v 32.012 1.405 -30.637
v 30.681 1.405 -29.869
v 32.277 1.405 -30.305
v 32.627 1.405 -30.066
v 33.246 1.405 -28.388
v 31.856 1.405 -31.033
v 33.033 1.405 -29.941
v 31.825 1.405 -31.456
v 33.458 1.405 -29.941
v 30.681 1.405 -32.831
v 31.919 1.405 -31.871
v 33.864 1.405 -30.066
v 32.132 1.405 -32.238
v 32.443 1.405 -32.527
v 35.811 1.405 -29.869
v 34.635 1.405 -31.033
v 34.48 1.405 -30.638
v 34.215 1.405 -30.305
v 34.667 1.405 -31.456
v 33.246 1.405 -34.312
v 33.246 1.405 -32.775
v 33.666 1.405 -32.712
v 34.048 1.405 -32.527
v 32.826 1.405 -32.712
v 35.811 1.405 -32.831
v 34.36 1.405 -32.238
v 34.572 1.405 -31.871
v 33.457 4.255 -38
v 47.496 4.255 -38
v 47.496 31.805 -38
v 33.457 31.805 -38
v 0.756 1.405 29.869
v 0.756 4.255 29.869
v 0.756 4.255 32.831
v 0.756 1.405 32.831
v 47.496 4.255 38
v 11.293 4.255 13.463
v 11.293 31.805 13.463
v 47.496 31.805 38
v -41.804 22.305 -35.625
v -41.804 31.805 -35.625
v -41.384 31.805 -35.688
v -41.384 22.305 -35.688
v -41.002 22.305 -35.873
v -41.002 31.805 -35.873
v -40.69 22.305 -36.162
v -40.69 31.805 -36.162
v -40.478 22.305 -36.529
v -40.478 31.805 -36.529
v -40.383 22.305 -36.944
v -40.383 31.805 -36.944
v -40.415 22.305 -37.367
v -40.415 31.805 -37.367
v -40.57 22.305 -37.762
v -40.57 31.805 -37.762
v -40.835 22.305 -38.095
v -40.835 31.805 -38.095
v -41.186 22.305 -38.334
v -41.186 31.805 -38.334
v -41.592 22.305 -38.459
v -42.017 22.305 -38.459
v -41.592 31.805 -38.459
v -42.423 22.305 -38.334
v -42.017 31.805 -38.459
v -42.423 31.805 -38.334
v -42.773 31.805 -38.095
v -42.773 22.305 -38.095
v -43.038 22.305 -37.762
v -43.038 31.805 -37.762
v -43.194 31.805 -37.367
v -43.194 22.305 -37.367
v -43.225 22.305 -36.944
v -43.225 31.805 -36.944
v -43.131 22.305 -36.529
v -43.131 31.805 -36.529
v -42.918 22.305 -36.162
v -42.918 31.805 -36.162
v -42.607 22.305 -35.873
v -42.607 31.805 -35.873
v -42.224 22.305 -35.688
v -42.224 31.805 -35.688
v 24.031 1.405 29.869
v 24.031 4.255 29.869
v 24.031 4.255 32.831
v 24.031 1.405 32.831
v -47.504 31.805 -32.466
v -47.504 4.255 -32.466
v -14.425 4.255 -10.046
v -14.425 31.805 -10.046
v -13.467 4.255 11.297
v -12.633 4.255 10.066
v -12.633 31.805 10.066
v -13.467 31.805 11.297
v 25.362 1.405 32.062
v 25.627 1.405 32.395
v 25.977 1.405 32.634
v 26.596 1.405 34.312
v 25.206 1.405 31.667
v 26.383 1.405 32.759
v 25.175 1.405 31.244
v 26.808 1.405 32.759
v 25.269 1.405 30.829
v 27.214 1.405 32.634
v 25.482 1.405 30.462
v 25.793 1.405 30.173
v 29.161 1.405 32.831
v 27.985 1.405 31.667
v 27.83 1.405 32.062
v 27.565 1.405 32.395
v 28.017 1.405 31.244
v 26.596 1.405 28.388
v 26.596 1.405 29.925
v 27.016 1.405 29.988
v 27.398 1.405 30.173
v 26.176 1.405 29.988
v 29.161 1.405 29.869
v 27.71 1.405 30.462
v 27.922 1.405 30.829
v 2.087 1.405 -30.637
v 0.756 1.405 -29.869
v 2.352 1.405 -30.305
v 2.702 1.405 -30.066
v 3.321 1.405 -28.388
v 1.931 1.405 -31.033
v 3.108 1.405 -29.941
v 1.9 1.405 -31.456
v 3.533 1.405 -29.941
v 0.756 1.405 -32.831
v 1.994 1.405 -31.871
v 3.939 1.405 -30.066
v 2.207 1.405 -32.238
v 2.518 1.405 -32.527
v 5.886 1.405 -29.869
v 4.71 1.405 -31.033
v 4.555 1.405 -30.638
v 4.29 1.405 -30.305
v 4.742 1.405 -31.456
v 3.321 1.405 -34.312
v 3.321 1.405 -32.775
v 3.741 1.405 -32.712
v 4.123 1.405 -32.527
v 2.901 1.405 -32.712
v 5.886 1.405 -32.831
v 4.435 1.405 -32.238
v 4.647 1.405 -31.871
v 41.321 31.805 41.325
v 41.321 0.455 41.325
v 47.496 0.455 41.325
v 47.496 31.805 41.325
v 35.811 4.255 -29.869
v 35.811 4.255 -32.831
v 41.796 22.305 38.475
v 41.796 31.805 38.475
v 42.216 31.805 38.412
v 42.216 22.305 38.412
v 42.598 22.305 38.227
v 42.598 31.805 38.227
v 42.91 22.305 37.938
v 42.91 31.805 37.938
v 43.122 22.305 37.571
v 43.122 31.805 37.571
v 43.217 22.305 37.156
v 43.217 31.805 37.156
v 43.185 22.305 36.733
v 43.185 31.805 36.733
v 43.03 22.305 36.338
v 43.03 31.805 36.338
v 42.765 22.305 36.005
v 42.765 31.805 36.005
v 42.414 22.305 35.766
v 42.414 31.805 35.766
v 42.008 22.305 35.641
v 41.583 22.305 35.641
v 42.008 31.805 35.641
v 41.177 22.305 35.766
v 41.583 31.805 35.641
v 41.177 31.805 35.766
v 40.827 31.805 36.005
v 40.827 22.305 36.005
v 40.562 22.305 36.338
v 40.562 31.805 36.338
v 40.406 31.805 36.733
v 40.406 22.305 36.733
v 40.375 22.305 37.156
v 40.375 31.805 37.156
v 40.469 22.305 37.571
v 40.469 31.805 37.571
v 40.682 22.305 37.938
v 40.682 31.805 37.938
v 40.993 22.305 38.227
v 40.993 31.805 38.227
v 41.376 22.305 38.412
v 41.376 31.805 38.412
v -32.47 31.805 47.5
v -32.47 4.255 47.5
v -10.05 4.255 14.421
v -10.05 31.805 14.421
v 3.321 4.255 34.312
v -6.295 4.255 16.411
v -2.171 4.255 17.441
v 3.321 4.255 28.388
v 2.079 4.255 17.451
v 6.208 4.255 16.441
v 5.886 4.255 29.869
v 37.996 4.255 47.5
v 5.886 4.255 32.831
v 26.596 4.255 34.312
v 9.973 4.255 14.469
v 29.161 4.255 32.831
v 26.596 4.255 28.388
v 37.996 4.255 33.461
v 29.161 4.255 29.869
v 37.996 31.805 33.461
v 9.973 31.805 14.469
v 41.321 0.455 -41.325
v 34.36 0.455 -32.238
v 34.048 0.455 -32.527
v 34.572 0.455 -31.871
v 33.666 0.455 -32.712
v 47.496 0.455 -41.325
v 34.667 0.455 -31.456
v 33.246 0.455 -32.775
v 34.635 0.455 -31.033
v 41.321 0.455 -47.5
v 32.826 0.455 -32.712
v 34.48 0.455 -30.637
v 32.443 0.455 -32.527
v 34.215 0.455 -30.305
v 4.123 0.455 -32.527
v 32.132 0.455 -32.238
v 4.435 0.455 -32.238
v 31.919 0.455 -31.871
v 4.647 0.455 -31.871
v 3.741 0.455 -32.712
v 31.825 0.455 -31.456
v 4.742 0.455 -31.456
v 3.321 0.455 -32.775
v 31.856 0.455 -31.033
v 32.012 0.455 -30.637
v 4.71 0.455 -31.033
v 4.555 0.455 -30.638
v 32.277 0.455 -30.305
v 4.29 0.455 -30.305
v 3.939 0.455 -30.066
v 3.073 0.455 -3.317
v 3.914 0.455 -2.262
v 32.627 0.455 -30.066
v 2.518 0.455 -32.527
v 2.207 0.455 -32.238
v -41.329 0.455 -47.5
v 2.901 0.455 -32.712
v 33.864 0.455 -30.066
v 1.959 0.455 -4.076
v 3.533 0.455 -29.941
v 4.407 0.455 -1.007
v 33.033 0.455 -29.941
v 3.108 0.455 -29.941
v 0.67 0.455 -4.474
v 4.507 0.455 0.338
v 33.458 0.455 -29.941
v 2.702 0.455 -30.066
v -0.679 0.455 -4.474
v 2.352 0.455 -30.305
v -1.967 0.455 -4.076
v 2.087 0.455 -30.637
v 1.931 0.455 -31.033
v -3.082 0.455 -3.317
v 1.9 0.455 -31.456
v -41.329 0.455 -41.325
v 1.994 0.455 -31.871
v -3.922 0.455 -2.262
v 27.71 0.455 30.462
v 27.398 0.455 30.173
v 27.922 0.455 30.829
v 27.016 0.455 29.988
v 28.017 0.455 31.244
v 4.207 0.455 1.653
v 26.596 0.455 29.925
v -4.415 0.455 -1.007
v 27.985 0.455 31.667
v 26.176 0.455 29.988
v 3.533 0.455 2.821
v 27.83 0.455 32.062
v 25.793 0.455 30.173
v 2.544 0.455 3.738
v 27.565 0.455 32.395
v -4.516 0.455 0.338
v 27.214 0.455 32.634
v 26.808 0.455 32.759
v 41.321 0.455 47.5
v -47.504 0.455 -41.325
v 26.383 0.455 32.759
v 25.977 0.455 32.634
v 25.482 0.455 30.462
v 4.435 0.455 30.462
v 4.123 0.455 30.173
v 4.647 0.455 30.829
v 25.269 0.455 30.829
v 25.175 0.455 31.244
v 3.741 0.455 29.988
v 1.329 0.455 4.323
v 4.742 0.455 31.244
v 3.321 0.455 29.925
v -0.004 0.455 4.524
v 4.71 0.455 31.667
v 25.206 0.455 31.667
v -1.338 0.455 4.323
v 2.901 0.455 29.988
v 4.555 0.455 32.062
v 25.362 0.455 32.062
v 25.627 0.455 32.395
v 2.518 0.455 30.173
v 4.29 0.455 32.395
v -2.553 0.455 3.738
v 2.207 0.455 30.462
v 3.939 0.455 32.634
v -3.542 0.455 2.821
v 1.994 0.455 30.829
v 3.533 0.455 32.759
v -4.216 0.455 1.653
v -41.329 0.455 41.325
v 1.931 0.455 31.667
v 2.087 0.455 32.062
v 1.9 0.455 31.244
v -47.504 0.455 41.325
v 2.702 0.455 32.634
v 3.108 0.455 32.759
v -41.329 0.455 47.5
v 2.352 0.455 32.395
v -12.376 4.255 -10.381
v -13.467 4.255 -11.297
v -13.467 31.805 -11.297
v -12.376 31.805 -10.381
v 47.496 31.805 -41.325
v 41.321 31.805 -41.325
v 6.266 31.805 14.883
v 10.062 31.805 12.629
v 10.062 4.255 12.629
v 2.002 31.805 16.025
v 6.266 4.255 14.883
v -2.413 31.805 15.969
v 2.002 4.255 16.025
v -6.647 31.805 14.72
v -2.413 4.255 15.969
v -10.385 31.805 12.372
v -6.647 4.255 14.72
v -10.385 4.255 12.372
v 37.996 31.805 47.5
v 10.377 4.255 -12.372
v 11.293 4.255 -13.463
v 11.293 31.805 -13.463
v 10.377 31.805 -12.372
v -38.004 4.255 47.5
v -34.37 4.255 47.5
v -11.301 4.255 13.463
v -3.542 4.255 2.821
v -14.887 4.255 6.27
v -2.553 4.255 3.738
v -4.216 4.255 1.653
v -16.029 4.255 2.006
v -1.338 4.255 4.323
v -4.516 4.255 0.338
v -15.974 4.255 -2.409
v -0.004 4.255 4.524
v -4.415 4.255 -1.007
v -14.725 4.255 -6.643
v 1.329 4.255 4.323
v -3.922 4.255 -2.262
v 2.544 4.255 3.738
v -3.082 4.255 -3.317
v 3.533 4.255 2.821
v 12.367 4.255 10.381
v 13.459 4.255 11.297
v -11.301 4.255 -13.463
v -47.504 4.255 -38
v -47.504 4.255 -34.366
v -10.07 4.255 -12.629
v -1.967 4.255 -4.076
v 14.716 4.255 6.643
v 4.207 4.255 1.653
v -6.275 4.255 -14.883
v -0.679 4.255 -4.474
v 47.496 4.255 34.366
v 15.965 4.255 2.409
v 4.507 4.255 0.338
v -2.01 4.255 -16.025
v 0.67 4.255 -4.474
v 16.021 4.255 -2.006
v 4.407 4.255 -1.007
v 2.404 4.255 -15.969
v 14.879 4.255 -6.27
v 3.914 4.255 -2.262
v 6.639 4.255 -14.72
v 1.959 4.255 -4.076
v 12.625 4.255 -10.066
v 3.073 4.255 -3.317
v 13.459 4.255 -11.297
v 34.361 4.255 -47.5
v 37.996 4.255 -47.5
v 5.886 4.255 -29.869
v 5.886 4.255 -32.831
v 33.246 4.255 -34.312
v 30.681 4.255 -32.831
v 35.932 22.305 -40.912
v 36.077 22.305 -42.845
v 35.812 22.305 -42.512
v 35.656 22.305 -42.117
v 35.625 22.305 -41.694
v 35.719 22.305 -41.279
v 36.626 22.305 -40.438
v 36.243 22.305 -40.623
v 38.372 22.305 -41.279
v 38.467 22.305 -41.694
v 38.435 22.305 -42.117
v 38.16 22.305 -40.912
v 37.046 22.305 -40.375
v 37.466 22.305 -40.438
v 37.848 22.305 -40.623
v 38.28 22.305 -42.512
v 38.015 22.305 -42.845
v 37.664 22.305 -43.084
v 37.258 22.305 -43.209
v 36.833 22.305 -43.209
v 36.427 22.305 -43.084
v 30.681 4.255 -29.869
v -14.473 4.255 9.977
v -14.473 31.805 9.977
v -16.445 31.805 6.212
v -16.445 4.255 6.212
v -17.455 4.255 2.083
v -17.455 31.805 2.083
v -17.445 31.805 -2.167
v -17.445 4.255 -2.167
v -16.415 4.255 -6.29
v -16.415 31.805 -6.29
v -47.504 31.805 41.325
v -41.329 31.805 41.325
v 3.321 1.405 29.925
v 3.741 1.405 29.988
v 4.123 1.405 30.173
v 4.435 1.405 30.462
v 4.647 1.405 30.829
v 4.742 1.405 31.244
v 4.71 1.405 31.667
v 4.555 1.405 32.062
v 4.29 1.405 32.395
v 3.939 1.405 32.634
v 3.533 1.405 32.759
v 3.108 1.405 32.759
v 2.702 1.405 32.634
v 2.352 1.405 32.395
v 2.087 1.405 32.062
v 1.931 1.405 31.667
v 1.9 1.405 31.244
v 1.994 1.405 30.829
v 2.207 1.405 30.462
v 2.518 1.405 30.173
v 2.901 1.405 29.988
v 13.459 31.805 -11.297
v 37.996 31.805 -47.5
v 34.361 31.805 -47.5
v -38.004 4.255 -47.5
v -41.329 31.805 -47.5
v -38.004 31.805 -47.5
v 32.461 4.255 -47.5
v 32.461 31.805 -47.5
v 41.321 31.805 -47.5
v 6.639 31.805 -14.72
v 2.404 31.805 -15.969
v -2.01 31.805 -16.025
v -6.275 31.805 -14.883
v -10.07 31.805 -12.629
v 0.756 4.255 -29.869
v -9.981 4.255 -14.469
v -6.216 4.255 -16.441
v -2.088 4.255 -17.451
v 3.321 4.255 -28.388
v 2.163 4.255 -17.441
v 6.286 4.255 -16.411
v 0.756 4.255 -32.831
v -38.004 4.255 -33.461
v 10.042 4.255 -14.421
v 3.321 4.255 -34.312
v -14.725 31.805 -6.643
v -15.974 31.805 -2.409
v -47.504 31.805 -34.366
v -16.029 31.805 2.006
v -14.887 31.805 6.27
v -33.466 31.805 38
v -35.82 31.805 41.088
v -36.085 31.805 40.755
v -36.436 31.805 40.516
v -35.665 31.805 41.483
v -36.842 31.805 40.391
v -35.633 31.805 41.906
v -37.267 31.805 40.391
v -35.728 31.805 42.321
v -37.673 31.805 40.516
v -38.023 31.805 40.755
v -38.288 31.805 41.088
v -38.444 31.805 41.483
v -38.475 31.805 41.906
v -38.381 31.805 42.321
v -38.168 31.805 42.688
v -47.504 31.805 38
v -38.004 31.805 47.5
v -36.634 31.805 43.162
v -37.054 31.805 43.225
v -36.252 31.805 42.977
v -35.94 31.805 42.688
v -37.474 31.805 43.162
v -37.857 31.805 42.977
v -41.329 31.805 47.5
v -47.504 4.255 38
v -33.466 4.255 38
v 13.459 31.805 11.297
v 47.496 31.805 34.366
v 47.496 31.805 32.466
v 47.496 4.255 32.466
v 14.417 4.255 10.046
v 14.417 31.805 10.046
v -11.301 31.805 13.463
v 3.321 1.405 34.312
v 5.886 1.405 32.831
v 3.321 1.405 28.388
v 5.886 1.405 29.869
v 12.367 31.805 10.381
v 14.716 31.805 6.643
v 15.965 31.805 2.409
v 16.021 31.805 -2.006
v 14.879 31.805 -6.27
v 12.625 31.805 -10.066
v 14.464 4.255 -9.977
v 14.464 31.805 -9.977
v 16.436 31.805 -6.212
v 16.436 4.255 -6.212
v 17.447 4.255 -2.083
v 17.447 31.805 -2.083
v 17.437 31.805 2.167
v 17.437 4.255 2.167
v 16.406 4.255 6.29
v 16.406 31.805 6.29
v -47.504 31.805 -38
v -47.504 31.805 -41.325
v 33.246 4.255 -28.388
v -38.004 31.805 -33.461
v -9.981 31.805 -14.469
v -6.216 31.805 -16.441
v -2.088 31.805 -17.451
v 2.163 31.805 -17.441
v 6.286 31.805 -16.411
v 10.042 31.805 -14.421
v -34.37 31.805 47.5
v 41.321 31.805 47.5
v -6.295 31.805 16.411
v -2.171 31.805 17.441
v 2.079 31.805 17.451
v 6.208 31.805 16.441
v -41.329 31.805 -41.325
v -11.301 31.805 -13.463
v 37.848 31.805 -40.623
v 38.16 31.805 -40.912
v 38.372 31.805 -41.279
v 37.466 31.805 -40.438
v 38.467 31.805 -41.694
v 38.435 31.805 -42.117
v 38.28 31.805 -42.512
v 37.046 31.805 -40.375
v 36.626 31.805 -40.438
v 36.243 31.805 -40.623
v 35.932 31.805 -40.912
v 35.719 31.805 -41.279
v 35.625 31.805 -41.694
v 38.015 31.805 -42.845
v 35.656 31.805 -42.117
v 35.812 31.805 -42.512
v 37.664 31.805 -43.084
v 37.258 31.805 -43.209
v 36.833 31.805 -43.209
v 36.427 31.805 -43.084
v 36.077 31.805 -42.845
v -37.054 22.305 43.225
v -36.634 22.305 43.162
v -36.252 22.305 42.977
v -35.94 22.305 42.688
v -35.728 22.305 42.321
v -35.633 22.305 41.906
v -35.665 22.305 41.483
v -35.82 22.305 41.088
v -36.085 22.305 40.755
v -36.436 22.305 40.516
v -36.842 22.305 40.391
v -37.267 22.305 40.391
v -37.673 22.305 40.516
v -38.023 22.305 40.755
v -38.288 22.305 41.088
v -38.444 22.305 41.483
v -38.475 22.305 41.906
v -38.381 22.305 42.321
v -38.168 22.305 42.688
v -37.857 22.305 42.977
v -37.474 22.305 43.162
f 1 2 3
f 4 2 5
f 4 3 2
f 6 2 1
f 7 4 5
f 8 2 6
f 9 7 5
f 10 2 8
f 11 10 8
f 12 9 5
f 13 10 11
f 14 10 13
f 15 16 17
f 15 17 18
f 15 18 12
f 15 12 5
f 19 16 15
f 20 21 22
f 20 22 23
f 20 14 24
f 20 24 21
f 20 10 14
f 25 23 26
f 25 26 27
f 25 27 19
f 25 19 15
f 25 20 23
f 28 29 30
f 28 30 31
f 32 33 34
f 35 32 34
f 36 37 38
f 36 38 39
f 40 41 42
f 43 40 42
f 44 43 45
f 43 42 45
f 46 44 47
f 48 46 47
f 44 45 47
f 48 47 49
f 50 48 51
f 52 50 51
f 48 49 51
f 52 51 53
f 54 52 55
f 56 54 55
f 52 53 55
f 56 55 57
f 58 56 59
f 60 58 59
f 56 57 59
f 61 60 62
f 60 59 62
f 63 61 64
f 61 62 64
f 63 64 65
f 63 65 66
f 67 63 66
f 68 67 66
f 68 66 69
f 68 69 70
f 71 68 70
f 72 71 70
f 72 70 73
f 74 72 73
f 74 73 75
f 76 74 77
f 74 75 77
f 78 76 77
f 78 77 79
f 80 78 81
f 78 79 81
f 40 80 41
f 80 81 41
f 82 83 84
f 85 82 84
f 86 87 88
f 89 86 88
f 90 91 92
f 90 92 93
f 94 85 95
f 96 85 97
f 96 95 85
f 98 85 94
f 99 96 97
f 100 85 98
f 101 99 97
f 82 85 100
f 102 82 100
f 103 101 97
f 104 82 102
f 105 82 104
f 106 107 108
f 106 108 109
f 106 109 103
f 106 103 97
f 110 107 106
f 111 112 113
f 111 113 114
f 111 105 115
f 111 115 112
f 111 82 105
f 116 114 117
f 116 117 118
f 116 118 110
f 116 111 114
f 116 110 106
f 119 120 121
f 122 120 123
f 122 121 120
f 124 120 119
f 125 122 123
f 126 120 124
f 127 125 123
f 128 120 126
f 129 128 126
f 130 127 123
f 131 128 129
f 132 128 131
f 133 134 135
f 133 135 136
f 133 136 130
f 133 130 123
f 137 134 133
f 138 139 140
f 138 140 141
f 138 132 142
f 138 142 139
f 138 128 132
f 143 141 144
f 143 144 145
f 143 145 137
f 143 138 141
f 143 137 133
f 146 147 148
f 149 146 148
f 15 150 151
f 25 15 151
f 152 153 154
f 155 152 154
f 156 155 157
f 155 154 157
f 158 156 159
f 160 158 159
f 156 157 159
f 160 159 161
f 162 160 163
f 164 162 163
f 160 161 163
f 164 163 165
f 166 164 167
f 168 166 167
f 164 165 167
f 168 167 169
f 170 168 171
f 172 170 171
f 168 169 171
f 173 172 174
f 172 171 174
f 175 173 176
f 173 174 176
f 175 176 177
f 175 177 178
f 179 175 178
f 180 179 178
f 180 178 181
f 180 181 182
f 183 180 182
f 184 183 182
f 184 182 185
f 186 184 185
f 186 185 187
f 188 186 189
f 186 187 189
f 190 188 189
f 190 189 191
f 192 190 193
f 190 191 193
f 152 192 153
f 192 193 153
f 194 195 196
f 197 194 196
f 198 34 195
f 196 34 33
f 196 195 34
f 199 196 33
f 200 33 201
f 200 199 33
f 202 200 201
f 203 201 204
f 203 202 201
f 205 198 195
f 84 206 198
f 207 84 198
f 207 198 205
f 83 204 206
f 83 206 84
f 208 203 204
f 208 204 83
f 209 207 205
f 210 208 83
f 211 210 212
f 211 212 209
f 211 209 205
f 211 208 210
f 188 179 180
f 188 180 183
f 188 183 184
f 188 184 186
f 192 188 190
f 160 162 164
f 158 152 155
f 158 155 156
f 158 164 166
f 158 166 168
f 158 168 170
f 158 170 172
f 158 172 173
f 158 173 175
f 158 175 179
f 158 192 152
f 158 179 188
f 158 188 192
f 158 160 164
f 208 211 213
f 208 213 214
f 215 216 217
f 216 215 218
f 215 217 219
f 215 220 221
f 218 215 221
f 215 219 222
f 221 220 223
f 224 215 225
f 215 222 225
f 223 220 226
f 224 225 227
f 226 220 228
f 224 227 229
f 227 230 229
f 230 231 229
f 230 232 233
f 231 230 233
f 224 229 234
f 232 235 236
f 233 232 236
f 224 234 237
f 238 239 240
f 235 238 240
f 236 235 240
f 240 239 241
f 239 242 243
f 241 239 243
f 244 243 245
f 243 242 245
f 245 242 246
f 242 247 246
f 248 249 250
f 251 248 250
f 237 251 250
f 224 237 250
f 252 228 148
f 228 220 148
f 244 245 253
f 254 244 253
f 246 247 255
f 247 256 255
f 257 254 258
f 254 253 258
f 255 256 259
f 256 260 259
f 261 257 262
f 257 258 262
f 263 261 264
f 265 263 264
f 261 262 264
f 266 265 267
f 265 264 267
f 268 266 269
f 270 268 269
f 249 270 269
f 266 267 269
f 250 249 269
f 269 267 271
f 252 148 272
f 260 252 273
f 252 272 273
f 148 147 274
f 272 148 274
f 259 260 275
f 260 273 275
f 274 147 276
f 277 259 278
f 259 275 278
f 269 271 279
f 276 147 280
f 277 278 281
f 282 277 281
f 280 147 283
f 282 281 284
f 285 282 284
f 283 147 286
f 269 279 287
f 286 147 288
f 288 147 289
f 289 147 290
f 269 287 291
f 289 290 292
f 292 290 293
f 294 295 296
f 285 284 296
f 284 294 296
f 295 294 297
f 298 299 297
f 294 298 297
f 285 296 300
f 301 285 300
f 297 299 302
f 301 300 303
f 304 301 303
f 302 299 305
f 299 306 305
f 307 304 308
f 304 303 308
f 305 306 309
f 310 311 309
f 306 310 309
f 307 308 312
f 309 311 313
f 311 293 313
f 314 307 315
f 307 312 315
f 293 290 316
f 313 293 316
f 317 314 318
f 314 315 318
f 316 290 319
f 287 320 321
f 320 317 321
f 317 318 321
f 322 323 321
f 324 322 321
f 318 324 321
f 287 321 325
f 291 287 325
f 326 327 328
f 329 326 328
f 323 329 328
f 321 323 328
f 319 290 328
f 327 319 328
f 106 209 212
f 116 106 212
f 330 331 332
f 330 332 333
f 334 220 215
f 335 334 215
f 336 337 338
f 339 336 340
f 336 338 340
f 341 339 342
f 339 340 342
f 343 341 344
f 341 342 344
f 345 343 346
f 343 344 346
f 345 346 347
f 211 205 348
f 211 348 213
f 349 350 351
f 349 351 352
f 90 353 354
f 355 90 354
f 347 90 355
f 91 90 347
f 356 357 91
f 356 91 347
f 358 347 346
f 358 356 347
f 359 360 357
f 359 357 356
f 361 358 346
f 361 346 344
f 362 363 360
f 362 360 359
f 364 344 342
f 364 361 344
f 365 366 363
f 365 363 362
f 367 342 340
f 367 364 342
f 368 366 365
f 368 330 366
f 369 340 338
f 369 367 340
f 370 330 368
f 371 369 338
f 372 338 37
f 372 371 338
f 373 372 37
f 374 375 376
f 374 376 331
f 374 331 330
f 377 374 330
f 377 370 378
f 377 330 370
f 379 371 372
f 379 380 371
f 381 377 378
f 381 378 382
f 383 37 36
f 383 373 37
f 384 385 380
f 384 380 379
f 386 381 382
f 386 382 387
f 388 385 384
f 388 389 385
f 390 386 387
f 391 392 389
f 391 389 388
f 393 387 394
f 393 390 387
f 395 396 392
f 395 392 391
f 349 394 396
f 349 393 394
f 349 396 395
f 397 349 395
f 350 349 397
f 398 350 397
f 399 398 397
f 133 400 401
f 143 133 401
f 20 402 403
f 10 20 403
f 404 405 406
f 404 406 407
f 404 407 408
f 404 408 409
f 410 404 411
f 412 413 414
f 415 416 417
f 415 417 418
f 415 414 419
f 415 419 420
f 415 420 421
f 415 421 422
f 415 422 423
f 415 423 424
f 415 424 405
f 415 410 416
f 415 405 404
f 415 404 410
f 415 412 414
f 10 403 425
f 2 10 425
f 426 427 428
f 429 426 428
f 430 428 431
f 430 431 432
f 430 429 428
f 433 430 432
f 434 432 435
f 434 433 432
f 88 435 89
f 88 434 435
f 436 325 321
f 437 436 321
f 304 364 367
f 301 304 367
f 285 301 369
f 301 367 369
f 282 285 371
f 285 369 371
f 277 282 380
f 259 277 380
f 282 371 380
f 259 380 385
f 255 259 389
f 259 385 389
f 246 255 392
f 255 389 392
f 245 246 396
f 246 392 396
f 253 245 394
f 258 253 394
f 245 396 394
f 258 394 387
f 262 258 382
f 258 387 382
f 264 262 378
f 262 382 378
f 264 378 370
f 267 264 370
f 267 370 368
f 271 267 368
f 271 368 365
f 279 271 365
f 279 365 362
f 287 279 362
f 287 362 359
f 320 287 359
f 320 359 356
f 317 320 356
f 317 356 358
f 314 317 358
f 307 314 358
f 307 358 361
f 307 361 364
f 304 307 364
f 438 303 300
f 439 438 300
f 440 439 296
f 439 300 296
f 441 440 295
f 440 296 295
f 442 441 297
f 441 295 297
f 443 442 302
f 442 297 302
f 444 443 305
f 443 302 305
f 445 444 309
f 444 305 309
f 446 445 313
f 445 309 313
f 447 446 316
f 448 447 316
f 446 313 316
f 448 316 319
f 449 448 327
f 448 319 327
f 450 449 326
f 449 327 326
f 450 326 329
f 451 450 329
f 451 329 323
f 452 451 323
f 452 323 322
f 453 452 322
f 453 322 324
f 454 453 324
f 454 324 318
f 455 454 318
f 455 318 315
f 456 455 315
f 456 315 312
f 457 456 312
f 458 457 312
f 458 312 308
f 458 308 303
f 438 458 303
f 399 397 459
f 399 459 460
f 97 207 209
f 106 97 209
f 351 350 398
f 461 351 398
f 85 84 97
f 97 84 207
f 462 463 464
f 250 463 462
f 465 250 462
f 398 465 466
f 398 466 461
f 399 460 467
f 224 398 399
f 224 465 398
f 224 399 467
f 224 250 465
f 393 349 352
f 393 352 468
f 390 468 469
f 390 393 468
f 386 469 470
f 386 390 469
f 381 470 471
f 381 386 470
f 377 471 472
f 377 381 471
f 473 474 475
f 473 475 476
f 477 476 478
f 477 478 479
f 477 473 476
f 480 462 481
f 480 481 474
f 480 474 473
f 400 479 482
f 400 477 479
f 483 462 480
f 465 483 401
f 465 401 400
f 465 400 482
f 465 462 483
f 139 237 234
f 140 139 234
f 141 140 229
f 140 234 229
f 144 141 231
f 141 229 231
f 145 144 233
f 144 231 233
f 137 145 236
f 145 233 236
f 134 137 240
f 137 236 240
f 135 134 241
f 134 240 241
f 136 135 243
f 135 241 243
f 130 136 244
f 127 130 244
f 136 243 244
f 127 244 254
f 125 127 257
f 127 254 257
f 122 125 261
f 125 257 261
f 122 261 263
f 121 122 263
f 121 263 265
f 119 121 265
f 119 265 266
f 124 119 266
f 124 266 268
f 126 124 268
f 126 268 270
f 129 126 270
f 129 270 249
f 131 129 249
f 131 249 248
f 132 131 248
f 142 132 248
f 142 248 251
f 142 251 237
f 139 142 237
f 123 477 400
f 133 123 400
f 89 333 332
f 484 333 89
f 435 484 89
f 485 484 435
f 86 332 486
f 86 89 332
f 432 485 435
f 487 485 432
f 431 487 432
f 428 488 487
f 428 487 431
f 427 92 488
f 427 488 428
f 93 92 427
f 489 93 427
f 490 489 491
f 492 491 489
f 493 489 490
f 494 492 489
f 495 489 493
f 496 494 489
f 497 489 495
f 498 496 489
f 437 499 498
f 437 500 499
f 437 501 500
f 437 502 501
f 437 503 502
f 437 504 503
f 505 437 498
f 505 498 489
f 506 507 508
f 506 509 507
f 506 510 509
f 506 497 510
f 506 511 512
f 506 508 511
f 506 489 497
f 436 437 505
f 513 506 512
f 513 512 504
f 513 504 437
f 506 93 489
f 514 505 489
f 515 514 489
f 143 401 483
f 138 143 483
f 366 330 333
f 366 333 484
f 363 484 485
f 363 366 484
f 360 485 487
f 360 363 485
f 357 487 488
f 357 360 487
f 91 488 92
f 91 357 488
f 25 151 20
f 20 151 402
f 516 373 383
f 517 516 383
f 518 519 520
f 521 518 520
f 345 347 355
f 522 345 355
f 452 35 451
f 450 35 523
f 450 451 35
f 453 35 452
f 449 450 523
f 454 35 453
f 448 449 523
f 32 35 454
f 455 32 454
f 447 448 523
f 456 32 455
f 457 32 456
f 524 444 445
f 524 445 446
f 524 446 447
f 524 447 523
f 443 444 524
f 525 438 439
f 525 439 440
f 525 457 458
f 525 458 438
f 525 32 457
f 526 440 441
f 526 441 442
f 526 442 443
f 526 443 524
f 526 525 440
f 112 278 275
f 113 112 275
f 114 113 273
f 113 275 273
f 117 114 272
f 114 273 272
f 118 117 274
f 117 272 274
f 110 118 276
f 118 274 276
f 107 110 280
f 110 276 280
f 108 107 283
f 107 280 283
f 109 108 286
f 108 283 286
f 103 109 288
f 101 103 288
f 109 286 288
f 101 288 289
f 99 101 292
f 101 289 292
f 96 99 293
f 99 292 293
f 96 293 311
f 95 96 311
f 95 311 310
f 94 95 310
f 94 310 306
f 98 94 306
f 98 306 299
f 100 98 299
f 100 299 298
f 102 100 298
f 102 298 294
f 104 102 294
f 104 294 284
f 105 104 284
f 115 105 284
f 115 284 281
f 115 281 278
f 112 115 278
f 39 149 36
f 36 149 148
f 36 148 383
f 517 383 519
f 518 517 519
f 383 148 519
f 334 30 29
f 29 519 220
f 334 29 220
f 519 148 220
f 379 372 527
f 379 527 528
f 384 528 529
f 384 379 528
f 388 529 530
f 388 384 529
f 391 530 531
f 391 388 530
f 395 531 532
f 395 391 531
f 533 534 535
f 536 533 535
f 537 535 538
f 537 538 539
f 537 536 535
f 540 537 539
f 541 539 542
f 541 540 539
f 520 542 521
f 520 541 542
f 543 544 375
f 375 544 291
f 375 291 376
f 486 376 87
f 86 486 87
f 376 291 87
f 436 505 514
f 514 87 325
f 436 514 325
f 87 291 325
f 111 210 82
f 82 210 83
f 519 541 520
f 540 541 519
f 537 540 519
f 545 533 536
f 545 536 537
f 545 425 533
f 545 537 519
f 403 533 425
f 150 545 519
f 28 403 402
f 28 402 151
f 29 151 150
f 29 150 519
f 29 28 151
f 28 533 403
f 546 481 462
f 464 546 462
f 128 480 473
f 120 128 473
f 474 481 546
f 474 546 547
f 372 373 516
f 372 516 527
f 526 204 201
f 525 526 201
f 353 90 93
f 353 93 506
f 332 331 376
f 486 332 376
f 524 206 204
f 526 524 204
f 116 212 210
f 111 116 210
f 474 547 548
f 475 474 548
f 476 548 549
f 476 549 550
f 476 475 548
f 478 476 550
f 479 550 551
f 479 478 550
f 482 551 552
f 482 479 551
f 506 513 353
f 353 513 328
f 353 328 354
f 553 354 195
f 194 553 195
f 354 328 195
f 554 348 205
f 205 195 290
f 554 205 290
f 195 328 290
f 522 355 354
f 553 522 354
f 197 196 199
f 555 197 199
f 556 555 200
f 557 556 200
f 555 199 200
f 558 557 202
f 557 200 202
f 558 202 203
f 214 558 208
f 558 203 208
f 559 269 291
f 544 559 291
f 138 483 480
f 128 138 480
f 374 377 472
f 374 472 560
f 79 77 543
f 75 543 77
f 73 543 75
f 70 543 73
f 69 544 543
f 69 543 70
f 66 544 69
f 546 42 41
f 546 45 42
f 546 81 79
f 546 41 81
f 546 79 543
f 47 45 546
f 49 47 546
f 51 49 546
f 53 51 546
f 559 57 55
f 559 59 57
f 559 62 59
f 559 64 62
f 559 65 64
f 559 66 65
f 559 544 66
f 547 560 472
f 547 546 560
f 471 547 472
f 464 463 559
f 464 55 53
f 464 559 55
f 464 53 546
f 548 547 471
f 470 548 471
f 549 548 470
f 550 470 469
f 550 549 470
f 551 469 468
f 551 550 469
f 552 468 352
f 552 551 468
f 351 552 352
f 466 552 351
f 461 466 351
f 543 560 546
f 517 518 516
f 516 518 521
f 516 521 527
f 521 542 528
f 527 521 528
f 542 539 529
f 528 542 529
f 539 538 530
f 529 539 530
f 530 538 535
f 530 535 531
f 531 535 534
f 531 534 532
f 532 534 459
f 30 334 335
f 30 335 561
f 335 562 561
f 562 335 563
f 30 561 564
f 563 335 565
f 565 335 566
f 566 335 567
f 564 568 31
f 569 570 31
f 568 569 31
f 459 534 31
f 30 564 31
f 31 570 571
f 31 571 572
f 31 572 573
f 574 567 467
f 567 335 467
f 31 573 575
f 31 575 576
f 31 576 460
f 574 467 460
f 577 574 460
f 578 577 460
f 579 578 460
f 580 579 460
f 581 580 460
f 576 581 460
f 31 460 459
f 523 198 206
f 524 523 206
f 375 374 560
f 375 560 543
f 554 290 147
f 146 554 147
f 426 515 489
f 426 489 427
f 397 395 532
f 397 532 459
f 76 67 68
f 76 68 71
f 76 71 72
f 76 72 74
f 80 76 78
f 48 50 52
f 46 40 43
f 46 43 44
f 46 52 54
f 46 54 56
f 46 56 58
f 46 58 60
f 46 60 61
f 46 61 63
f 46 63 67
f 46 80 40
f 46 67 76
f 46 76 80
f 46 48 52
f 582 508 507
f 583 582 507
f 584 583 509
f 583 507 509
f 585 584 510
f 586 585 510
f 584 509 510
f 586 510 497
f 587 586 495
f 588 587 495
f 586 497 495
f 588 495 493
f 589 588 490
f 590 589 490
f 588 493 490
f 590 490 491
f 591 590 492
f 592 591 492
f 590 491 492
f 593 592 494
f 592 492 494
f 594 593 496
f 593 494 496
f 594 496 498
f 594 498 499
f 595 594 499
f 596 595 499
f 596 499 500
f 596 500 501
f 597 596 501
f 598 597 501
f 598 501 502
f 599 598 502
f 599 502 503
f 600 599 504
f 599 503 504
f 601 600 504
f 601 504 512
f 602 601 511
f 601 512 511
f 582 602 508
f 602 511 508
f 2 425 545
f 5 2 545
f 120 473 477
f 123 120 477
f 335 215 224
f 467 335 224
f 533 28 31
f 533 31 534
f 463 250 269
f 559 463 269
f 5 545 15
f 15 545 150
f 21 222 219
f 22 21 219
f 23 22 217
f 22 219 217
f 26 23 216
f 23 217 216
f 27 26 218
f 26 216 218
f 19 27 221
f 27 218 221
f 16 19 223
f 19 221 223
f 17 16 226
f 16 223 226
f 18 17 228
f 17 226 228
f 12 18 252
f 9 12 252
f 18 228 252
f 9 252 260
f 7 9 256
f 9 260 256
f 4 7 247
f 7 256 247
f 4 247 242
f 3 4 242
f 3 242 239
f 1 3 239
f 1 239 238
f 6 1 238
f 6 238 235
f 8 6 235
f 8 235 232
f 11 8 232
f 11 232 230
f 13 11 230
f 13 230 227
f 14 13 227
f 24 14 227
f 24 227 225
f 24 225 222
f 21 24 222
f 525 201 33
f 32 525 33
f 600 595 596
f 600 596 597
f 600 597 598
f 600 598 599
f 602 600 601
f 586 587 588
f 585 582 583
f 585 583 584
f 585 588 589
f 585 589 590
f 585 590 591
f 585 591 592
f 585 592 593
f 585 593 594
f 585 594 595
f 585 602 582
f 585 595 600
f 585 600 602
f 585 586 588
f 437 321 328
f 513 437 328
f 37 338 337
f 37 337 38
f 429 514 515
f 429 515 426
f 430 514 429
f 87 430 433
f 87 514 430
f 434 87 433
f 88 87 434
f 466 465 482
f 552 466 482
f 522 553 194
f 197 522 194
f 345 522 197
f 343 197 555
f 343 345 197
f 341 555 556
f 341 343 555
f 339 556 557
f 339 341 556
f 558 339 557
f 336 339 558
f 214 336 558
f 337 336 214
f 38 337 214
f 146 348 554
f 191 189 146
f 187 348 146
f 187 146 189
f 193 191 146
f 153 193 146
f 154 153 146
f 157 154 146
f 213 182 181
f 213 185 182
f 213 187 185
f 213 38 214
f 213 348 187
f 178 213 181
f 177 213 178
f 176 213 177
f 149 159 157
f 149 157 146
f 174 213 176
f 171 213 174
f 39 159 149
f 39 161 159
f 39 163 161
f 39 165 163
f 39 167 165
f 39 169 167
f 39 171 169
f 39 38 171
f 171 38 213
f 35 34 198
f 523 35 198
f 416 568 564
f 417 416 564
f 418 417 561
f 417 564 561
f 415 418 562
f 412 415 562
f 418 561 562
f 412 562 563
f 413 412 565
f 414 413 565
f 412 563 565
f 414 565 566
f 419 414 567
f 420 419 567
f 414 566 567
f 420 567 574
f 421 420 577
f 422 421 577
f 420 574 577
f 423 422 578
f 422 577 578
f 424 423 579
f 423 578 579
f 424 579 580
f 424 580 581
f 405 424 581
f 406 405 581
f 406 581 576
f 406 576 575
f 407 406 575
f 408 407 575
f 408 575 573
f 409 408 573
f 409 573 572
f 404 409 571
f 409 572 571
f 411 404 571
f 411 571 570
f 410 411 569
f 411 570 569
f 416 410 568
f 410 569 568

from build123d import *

# Parameters (mm, degrees)
SKETCH1_W           = 100
SKETCH1_H           = 100
BOSS_EXTRUDE1_DEPTH = 4
SKETCH2_R           = 4.7625
CUT_EXTRUDE1_DEPTH  = 71.823724839
SKETCH3_W           = 8.5
SKETCH3_H           = 8.5
CUT_EXTRUDE2_DEPTH  = 71.823724839
BOSS_EXTRUDE3_DEPTH = 29
BOSS_EXTRUDE4_DEPTH = 29
CUT_EXTRUDE4_DEPTH  = 77.426435217
BOSS_EXTRUDE5_DEPTH = 29
BOSS_EXTRUDE6_DEPTH = 29
SKETCH12_R          = 1.5
CUT_EXTRUDE5_DEPTH  = 79.0320447
CUT_EXTRUDE6_DEPTH  = 3
SKETCH15_R          = 1.5
CUT_EXTRUDE7_DEPTH  = 10
BOSS_EXTRUDE7_DEPTH = 33
SCALE1_SCALE        = 0.95


with BuildPart() as part:
    # Sketch1 → Boss-Extrude1 (new body)
    with BuildSketch(Plane(origin=(0, 0, 0), x_dir=(1, 0, 0), z_dir=(0, 1, 0))):
        Rectangle(SKETCH1_W, SKETCH1_H)
    extrude(amount=BOSS_EXTRUDE1_DEPTH)

    # Sketch2 → Cut-Extrude1 (cut, through all)
    with BuildSketch(Plane(origin=(0, 4, 0), x_dir=(1, 0, 0), z_dir=(0, 1, 0))):
        with Locations(Location((0, 0, 0), (0, 0, 270))):
            Circle(SKETCH2_R)
    extrude(amount=-CUT_EXTRUDE1_DEPTH, mode=Mode.SUBTRACT)

    # Sketch3 → Cut-Extrude2 (cut, through all)
    with BuildSketch(Plane(origin=(0, 4, 0), x_dir=(1, 0, 0), z_dir=(0, 1, 0))):
        with Locations((-45.75, 45.75)):
            Rectangle(SKETCH3_W, SKETCH3_H)
        with Locations((45.75, 45.75)):
            Rectangle(SKETCH3_W, SKETCH3_H)
        with Locations((45.75, -45.75)):
            Rectangle(SKETCH3_W, SKETCH3_H)
        with Locations((-45.75, -45.75)):
            Rectangle(SKETCH3_W, SKETCH3_H)
    extrude(amount=-CUT_EXTRUDE2_DEPTH, mode=Mode.SUBTRACT)

    # Sketch4 → Boss-Extrude3 (add)
    with BuildSketch(Plane(origin=(0, 4, 0), x_dir=(1, 0, 0), z_dir=(0, 1, 0))):
        with BuildLine():
            Line((-10.927389365, -13.022755533), (-11.891570779, -14.171822198))
            ThreePointArc((-11.891570779, -14.171822198), (0, -18.5), (11.891570779, -14.171822198))
            Line((11.891570779, -14.171822198), (10.927389365, -13.022755533))
            ThreePointArc((10.927389365, -13.022755533), (0, -17), (-10.927389365, -13.022755533))
        make_face()
        with BuildLine():
            Line((-13.022755533, -10.927389365), (-14.171822198, -11.891570779))
            ThreePointArc((-14.171822198, -11.891570779), (-18.5, 0), (-14.171822198, 11.891570779))
            Line((-14.171822198, 11.891570779), (-13.022755533, 10.927389365))
            ThreePointArc((-13.022755533, 10.927389365), (-17, 0), (-13.022755533, -10.927389365))
        make_face()
        with BuildLine():
            Line((-10.927389365, 13.022755533), (-11.891570779, 14.171822198))
            ThreePointArc((-11.891570779, 14.171822198), (0, 18.5), (11.891570779, 14.171822198))
            Line((11.891570779, 14.171822198), (10.927389365, 13.022755533))
            ThreePointArc((10.927389365, 13.022755533), (0, 17), (-10.927389365, 13.022755533))
        make_face()
        with BuildLine():
            Line((13.022755533, 10.927389365), (14.171822198, 11.891570779))
            ThreePointArc((14.171822198, 11.891570779), (18.5, 0), (14.171822198, -11.891570779))
            Line((14.171822198, -11.891570779), (13.022755533, -10.927389365))
            ThreePointArc((13.022755533, -10.927389365), (17, 0), (13.022755533, 10.927389365))
        make_face()
    extrude(amount=BOSS_EXTRUDE3_DEPTH)

    # Sketch7 → Boss-Extrude4 (add)
    with BuildSketch(Plane(origin=(0, 4, 0), x_dir=(1, 0, 0), z_dir=(0, 1, 0))):
        Polygon((-41.5, -41.5), (-41.5, -50), (-40, -50), (-40, -40), (-50, -40), (-50, -41.5), align=None)
        Polygon((40, -50), (40, -40), (50, -40), (50, -41.5), (41.5, -41.5), (41.5, -50), align=None)
        Polygon((50, 41.5), (50, 40), (40, 40), (40, 50), (41.5, 50), (41.5, 41.5), align=None)
        Polygon((-50, 41.5), (-50, 40), (-40, 40), (-40, 50), (-41.5, 50), (-41.5, 41.5), align=None)
    extrude(amount=BOSS_EXTRUDE4_DEPTH)

    # Sketch8 → Cut-Extrude4 (cut, through all)
    with BuildSketch(Plane(origin=(0, 4, 0), x_dir=(1, 0, 0), z_dir=(0, 1, 0))):
        Polygon((-14.171822198, -11.891570779), (-40, -50), (-36.17429682, -50), (-11.891570779, -14.171822198), (-9.867198001, -11.184942236), (-12.488706492, -9.408201793), align=None)
        Polygon((-11.891570779, 14.171822198), (-50, 40), (-50, 36.17429682), (-14.171822198, 11.891570779), (-11.184942236, 9.867198001), (-9.408201793, 12.488706492), align=None)
        Polygon((14.171822198, 11.891570779), (40, 50), (36.17429682, 50), (11.891570779, 14.171822198), (9.867198001, 11.184942236), (12.488706492, 9.408201793), align=None)
        Polygon((11.891570779, -14.171822198), (50, -40), (50, -36.17429682), (14.171822198, -11.891570779), (11.184942236, -9.867198001), (9.408201793, -12.488706492), align=None)
    extrude(amount=CUT_EXTRUDE4_DEPTH, mode=Mode.SUBTRACT)

    # Sketch9 → Boss-Extrude5 (add)
    with BuildSketch(Plane(origin=(0, 4, 0), x_dir=(1, 0, 0), z_dir=(0, 1, 0))):
        Polygon((-11.891570779, -14.171822198), (-36.17429682, -50), (-34.17429682, -50), (-10.52109933, -15.100666052), align=None)
        Polygon((-14.171822198, -11.891570779), (-40, -50), (-40, -47.049081084), (-14.981255079, -10.134937263), (-13.610783629, -11.063781117), align=None)
        Polygon((-50, 34.17429682), (-15.100666052, 10.52109933), (-14.171822198, 11.891570779), (-50, 36.17429682), align=None)
        Polygon((-11.891570779, 14.171822198), (-50, 40), (-47.049081084, 40), (-10.134937263, 14.981255079), (-11.063781117, 13.610783629), align=None)
        Polygon((34.17429682, 50), (10.52109933, 15.100666052), (11.891570779, 14.171822198), (36.17429682, 50), align=None)
        Polygon((14.171822198, 11.891570779), (40, 50), (40, 47.049081084), (14.981255079, 10.134937263), (13.610783629, 11.063781117), align=None)
        Polygon((50, -34.17429682), (15.100666052, -10.52109933), (14.171822198, -11.891570779), (50, -36.17429682), align=None)
        Polygon((11.891570779, -14.171822198), (50, -40), (47.049081084, -40), (10.134937263, -14.981255079), (11.063781117, -13.610783629), align=None)
    extrude(amount=BOSS_EXTRUDE5_DEPTH)

    # Sketch11 → Boss-Extrude6 (add)
    with BuildSketch(Plane(origin=(0, 4, 0), x_dir=(1, 0, 0), z_dir=(0, 1, 0))):
        Polygon((-40, -40), (-35.222450169, -40), (-40, -47.049081084), align=None)
        Polygon((-40, 40), (-40, 35.222450169), (-47.049081084, 40), align=None)
        Polygon((40, 40), (35.222450169, 40), (40, 47.049081084), align=None)
        Polygon((40, -40), (40, -35.222450169), (47.049081084, -40), align=None)
    extrude(amount=BOSS_EXTRUDE6_DEPTH)

    # Sketch12 → Cut-Extrude5 (cut, through all)
    with BuildSketch(Plane(origin=(0, 0, 0), x_dir=(-1, 0, 0), z_dir=(0, -1, 0))):
        with Locations(Location((-3.5, 33, 0), (0, 0, 90))):
            Circle(SKETCH12_R)
        with Locations(Location((-3.5, -33, 0), (0, 0, 90))):
            Circle(SKETCH12_R)
        with Locations(Location((-35, 33, 0), (0, 0, 90))):
            Circle(SKETCH12_R)
        with Locations(Location((-28, -33, 0), (0, 0, 90))):
            Circle(SKETCH12_R)
    extrude(amount=-CUT_EXTRUDE5_DEPTH, mode=Mode.SUBTRACT)

    # Sketch14 → Cut-Extrude6 (cut)
    with BuildSketch(Plane(origin=(0, 4, 0), x_dir=(1, 0, 0), z_dir=(0, 1, 0))):
        Polygon((28, -29.882308546), (25.3, -31.441154273), (25.3, -34.558845727), (28, -36.117691454), (30.7, -34.558845727), (30.7, -31.441154273), align=None)
        Polygon((3.5, -29.882308546), (0.8, -31.441154273), (0.8, -34.558845727), (3.5, -36.117691454), (6.2, -34.558845727), (6.2, -31.441154273), align=None)
        Polygon((3.5, 36.117691454), (0.8, 34.558845727), (0.8, 31.441154273), (3.5, 29.882308546), (6.2, 31.441154273), (6.2, 34.558845727), align=None)
        Polygon((35, 36.117691454), (32.3, 34.558845727), (32.3, 31.441154273), (35, 29.882308546), (37.7, 31.441154273), (37.7, 34.558845727), align=None)
    extrude(amount=-CUT_EXTRUDE6_DEPTH, mode=Mode.SUBTRACT)

    # Sketch15 → Cut-Extrude7 (cut)
    with BuildSketch(Plane(origin=(0, 33, 0), x_dir=(1, 0, 0), z_dir=(0, 1, 0))):
        with Locations(Location((44, -39, 0), (0, 0, 270))):
            Circle(SKETCH15_R)
        with Locations(Location((-39, -44, 0), (0, 0, 270))):
            Circle(SKETCH15_R)
        with Locations(Location((-44, 39, 0), (0, 0, 270))):
            Circle(SKETCH15_R)
        with Locations(Location((39, 44, 0), (0, 0, 270))):
            Circle(SKETCH15_R)
    extrude(amount=-CUT_EXTRUDE7_DEPTH, mode=Mode.SUBTRACT)

    # Sketch16 → Boss-Extrude7 (add)
    with BuildSketch(Plane.XZ):
        Polygon((-50, 41.5), (-50, 43.5), (-43.5, 43.5), (-43.5, 50), (-41.5, 50), (-41.5, 41.5), align=None)
        Polygon((50, 41.5), (41.5, 41.5), (41.5, 50), (43.5, 50), (43.5, 43.5), (50, 43.5), align=None)
        Polygon((50, -41.5), (50, -43.5), (43.5, -43.5), (43.5, -50), (41.5, -50), (41.5, -41.5), align=None)
        Polygon((-50, -41.5), (-41.5, -41.5), (-41.5, -50), (-43.5, -50), (-43.5, -43.5), (-50, -43.5), align=None)
    extrude(amount=-BOSS_EXTRUDE7_DEPTH)


with BuildPart() as part_1:
    # Scale1: scaled about (-0.08501153, 9.094594804, 0)
    add(part.part.scale(SCALE1_SCALE).moved(Location((-0.004250577, 0.45472974, 0))))


solid = part_1.part
